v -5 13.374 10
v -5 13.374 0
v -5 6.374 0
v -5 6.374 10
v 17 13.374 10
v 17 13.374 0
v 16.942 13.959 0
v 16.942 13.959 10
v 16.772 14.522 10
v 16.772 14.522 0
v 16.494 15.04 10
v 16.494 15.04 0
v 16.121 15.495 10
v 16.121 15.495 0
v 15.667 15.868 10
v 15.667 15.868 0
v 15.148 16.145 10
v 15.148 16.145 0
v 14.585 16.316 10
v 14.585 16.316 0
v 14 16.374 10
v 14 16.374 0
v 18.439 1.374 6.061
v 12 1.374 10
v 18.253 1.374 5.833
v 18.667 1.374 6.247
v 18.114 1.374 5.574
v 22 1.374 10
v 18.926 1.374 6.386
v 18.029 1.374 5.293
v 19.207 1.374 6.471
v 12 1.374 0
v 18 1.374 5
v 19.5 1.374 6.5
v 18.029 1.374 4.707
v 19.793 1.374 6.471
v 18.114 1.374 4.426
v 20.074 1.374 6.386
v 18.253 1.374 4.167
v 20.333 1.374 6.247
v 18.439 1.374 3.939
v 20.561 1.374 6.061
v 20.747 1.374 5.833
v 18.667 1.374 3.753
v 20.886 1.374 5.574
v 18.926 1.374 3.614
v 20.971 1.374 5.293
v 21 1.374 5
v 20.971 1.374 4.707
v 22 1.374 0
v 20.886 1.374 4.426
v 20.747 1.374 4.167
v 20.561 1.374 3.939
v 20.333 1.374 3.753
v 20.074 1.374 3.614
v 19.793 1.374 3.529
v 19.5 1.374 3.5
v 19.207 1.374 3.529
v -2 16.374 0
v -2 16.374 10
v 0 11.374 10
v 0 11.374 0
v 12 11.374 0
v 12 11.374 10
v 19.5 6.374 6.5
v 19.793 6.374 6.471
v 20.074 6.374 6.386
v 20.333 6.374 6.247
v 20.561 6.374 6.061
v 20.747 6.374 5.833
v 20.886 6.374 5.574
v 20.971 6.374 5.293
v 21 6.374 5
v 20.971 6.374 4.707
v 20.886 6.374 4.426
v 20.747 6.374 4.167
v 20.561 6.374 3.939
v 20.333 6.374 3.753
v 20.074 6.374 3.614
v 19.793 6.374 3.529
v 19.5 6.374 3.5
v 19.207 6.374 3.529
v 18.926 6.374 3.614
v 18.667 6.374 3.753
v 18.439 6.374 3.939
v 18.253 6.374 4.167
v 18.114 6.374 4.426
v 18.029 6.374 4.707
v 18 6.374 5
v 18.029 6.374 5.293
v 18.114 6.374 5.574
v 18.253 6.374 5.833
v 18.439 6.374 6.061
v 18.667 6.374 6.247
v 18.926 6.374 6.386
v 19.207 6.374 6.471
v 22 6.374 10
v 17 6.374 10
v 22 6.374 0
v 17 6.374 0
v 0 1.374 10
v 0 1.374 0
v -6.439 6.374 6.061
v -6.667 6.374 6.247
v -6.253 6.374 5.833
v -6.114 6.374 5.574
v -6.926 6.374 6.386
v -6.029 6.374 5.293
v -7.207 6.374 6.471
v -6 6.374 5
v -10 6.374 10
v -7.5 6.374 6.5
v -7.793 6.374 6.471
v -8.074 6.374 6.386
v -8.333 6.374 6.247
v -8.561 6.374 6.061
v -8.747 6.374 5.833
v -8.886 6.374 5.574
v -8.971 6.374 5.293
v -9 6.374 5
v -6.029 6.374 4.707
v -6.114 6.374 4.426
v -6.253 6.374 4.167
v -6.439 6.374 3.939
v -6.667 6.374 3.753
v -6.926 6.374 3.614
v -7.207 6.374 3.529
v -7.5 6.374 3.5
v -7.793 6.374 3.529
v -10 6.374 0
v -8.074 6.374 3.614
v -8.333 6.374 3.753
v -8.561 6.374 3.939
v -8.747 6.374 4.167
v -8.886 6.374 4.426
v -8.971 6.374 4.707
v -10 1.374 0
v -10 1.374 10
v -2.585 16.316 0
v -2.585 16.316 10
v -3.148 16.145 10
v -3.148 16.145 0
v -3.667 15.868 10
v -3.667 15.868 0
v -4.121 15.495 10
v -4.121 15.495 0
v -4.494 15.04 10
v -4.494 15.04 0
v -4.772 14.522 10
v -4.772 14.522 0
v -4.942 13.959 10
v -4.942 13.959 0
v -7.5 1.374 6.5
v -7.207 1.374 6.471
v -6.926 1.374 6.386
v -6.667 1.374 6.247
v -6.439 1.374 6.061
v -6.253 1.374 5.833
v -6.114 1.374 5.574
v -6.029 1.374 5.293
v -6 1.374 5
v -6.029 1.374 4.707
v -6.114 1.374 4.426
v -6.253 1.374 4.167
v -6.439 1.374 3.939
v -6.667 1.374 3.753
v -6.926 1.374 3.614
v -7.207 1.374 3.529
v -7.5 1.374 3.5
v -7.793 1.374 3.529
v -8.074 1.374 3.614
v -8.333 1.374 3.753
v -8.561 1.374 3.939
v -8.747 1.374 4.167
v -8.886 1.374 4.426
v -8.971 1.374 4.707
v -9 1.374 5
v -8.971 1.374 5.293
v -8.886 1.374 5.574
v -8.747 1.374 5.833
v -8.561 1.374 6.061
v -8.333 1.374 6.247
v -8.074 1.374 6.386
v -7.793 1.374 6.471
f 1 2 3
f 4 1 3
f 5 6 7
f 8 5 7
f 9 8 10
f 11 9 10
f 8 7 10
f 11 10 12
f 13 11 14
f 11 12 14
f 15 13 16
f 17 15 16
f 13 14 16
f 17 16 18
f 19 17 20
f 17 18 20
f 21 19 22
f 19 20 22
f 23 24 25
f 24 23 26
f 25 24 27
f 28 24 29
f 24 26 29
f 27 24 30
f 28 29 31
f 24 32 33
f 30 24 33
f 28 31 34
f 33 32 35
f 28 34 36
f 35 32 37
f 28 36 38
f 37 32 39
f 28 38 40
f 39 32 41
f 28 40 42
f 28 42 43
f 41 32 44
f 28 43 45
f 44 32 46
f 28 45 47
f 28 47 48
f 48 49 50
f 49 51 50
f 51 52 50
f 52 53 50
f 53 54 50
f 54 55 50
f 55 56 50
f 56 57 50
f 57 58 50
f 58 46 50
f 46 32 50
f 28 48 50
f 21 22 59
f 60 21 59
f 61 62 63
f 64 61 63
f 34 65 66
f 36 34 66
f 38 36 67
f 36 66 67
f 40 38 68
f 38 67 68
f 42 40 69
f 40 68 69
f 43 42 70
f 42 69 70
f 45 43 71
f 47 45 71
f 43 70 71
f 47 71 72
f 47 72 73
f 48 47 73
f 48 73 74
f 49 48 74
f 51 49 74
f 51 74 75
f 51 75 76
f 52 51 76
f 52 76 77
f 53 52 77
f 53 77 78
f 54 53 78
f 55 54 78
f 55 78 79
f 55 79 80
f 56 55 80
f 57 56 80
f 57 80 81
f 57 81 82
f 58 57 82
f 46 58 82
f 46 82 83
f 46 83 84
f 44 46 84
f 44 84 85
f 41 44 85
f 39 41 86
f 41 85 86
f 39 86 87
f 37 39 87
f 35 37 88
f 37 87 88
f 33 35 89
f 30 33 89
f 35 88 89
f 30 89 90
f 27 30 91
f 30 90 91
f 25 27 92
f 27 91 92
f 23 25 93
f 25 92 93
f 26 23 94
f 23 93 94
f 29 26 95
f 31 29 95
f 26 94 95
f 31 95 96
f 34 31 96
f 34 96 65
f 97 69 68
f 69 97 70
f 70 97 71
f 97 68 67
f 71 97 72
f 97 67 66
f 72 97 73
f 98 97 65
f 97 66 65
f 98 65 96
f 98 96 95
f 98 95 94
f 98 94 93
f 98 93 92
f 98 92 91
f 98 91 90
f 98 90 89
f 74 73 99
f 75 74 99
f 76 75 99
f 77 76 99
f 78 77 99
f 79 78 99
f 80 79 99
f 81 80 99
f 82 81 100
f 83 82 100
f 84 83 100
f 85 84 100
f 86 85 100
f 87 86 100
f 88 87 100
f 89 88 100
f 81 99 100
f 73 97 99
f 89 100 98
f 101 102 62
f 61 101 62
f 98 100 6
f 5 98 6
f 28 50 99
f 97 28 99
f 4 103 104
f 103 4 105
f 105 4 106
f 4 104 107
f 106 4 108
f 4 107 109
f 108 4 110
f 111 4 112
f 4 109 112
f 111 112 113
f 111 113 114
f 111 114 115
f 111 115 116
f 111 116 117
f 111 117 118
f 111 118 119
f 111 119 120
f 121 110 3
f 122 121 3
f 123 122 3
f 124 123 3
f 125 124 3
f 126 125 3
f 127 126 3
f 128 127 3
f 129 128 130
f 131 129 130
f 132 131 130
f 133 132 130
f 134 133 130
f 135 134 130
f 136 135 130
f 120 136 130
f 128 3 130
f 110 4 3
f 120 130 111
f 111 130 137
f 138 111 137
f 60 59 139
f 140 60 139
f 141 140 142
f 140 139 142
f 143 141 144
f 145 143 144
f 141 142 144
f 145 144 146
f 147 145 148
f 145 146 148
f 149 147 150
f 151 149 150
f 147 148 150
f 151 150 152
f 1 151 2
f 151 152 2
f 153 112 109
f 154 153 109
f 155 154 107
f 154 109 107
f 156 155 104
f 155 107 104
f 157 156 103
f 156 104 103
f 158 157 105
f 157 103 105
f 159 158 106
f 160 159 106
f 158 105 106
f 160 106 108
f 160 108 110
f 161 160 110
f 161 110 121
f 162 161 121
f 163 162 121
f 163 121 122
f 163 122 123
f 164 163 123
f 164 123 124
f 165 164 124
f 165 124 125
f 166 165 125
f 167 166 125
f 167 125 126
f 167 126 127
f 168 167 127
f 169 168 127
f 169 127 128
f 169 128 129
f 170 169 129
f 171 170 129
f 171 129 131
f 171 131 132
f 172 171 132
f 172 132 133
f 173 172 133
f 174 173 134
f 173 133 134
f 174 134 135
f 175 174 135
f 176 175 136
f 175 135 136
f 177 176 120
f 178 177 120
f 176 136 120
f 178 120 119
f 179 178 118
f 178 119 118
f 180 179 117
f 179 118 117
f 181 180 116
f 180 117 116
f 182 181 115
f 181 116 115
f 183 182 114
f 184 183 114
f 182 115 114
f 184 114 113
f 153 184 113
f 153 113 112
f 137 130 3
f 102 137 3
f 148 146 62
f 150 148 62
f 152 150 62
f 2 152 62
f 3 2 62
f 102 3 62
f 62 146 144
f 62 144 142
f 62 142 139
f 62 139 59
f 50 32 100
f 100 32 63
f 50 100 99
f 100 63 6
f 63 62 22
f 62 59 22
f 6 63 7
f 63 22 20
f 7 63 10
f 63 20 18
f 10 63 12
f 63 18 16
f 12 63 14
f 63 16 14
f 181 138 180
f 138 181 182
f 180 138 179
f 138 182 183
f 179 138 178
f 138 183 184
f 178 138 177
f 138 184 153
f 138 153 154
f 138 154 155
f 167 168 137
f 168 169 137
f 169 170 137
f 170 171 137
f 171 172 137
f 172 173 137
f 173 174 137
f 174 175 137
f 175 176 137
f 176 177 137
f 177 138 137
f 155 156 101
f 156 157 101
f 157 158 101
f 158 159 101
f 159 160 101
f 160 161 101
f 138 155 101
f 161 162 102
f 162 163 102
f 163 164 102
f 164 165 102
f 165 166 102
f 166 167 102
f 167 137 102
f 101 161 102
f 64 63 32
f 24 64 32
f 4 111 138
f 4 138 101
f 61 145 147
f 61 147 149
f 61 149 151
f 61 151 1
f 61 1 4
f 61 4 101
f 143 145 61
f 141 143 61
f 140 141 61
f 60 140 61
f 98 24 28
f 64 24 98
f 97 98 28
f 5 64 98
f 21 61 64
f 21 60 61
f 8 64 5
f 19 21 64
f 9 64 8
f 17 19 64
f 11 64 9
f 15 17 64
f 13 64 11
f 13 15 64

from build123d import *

# Parameters (mm, degrees)
BOSS_EXTRU_1_DEPTH      = 10
ESQUISSE2_R             = 1.5
ENL_V_MAT_EXTRU_1_DEPTH = 20


with BuildPart() as part:
    # Esquisse1 → Boss.-Extru.1 (new body)
    with BuildSketch(Plane.XY):
        with BuildLine():
            Line((0, 1.373626374), (0, 11.373626374))
            Line((0, 11.373626374), (12, 11.373626374))
            Line((12, 11.373626374), (12, 1.373626374))
            Line((12, 1.373626374), (22, 1.373626374))
            Line((22, 1.373626374), (22, 6.373626374))
            Line((22, 6.373626374), (17, 6.373626374))
            Line((17, 6.373626374), (17, 13.373626374))
            ThreePointArc((17, 13.373626374), (16.121320344, 15.494946717), (14, 16.373626374))
            Line((14, 16.373626374), (-2, 16.373626374))
            ThreePointArc((-2, 16.373626374), (-4.121320344, 15.494946717), (-5, 13.373626374))
            Line((-5, 13.373626374), (-5, 6.373626374))
            Line((-5, 6.373626374), (-10, 6.373626374))
            Line((-10, 6.373626374), (-10, 1.373626374))
            Line((-10, 1.373626374), (0, 1.373626374))
        make_face()
    extrude(amount=BOSS_EXTRU_1_DEPTH)

    # Esquisse2 → Enlèv. mat.-Extru.1 (cut)
    with BuildSketch(Plane(origin=(0, 6.373626374, 0), x_dir=(1, 0, 0), z_dir=(0, 1, 0))):
        with Locations((-7.5, -15)):
            Circle(ESQUISSE2_R)
        with Locations(Location((-7.5, -5, 0), (0, 0, 270))):
            Circle(ESQUISSE2_R)
        with Locations(Location((19.5, -5, 0), (0, 0, 270))):
            Circle(ESQUISSE2_R)
        with Locations((19.5, -15)):
            Circle(ESQUISSE2_R)
    extrude(amount=-ENL_V_MAT_EXTRU_1_DEPTH, mode=Mode.SUBTRACT)


solid = part.part
